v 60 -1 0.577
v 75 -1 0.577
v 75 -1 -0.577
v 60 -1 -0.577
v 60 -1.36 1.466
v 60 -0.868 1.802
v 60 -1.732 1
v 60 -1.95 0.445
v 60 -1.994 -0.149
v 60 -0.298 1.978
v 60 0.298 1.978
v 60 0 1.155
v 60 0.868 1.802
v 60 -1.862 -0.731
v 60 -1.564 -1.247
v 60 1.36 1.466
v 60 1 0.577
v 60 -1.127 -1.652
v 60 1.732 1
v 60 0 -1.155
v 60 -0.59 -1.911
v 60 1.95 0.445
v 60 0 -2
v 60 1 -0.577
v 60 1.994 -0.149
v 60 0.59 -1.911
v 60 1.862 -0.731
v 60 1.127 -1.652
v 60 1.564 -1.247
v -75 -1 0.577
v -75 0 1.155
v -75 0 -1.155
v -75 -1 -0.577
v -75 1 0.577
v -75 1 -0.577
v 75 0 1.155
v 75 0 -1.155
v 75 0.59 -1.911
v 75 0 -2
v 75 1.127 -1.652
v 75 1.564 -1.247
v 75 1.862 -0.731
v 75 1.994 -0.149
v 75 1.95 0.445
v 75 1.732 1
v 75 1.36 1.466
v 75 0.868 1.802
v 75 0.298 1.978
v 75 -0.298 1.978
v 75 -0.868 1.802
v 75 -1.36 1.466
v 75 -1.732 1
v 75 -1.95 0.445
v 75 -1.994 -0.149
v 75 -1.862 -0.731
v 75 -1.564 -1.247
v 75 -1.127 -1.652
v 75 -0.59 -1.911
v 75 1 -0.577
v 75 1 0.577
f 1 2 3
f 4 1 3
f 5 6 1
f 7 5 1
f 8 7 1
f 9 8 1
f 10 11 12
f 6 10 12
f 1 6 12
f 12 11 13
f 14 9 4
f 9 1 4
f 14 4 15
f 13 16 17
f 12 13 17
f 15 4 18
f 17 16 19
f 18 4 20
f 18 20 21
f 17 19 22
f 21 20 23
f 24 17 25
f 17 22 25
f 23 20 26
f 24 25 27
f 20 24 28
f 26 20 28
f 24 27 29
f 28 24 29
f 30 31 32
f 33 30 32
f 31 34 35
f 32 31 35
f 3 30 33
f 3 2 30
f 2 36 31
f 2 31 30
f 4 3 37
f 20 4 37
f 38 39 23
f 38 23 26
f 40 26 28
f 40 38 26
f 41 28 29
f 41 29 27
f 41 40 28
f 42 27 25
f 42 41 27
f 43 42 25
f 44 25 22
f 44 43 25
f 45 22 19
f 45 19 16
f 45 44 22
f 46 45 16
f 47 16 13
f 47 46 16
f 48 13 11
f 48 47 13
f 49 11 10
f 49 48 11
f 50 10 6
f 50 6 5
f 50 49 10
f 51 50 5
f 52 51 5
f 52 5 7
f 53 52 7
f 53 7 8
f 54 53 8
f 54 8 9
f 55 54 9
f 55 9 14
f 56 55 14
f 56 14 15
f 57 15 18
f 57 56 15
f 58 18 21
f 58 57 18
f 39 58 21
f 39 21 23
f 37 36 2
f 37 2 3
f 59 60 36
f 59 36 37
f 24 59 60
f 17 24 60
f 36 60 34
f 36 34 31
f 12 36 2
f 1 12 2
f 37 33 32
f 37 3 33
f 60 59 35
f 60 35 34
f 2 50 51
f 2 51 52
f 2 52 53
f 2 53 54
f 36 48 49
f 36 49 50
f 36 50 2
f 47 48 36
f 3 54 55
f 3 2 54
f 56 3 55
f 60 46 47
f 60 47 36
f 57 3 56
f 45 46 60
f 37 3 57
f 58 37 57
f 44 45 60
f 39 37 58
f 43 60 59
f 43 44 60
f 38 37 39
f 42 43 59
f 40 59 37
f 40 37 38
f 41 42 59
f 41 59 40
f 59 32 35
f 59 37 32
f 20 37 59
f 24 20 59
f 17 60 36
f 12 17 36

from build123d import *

# Parameters (mm, degrees)
AXLE_HEX_2MM_DEPTH  = 75
SKETCH2_R           = 2
BOSS_EXTRUDE1_DEPTH = 15


with BuildPart() as part:
    # Sketch1 → Axle-Hex-2mm (new, symmetric)
    with BuildSketch(Plane(origin=(0, 0, 0), x_dir=(0, 0, -1), z_dir=(1, 0, 0))):
        Polygon((1.154700538, 0), (0.577350269, 1), (-0.577350269, 1), (-1.154700538, 0), (-0.577350269, -1), (0.577350269, -1), align=None)
    extrude(amount=AXLE_HEX_2MM_DEPTH, both=True)


with BuildPart() as body_2:
    # Sketch2 → Boss-Extrude1 (new body)
    with BuildSketch(Plane(origin=(75, 0, 0), x_dir=(0, 0, -1), z_dir=(1, 0, 0))):
        Circle(SKETCH2_R)
        Polygon((0.577350269, -1), (1.154700538, 0), (0.577350269, 1), (-0.577350269, 1), (-1.154700538, 0), (-0.577350269, -1), align=None, mode=Mode.SUBTRACT)
    extrude(amount=-BOSS_EXTRUDE1_DEPTH)


solid = Compound([part.part, body_2.part])
